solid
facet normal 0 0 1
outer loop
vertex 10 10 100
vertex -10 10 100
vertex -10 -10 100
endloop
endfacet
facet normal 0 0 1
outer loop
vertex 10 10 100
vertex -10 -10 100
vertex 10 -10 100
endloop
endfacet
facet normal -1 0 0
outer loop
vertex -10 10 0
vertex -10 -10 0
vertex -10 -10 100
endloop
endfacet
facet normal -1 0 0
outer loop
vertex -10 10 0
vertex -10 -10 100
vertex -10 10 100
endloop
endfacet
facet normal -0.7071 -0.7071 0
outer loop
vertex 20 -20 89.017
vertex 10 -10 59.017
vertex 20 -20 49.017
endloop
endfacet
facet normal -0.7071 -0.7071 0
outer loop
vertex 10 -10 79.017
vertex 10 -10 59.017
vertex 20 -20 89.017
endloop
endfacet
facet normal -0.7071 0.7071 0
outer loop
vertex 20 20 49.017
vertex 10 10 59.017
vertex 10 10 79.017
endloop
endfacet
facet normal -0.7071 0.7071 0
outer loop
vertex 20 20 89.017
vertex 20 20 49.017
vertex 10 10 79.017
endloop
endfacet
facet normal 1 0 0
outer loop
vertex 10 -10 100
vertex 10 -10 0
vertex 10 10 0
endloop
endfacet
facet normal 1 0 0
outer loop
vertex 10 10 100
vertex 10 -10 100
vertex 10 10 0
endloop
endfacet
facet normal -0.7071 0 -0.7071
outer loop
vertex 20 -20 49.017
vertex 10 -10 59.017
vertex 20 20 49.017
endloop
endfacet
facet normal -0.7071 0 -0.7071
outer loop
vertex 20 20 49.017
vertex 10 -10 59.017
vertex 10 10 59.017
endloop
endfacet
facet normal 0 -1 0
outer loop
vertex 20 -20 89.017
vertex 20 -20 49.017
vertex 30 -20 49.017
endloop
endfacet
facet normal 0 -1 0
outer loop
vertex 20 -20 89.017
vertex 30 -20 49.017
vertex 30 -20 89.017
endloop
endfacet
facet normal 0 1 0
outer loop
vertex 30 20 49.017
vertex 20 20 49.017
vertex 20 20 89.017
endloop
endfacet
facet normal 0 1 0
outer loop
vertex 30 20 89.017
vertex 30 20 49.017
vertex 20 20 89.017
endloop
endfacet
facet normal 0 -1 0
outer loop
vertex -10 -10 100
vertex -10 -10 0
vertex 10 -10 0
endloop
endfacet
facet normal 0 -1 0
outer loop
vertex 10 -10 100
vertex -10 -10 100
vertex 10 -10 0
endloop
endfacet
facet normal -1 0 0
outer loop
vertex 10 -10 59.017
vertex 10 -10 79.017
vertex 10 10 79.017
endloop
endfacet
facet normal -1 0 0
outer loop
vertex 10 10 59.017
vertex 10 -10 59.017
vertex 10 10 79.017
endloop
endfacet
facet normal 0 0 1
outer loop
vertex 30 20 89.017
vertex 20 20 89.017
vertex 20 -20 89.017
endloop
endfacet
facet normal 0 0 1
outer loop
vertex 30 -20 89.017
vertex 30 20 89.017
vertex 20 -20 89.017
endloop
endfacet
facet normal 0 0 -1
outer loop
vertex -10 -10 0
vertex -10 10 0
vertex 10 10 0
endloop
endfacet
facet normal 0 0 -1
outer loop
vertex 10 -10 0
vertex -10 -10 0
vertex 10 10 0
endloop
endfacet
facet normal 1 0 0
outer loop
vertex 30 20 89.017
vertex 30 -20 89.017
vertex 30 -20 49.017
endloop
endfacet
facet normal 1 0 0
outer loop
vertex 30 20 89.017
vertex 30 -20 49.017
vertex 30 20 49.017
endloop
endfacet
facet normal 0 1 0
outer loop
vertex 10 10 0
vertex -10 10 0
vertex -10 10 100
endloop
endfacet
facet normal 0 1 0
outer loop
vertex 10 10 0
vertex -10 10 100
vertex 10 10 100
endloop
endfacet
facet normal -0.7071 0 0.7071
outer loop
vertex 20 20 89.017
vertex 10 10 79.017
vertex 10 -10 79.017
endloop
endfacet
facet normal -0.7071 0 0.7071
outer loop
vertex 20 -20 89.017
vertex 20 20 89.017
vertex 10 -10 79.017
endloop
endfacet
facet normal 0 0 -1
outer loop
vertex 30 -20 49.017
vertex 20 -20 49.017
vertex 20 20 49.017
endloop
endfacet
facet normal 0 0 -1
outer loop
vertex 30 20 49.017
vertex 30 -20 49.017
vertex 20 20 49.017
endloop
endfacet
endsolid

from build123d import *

# Parameters (mm, degrees)
F0_W     = 20
F0_H     = 20
F1_DEPTH = 100
F2_W     = 10
F2_H     = 40
F2_W_2   = 20
F3_DEPTH = 20
F4_SIZE  = 10


with BuildPart() as f1:
    # F0 (on Top) → F1 (new body)
    with BuildSketch(Plane.XY):
        Rectangle(F0_W, F0_H)
    extrude(amount=F1_DEPTH)


with BuildPart() as f3:
    # F2 (on face) → F3 (new body)
    with BuildSketch(Plane.YZ.offset(10)):
        with Locations((-15, 69.0170936286)):
            Rectangle(F2_W, F2_H)
        with Locations((0, 69.0170936286)):
            Rectangle(F2_W_2, F2_H)
        with Locations((15, 69.0170936286)):
            Rectangle(F2_W, F2_H)
    extrude(amount=F3_DEPTH)

    # F4
    f4_edges = [f3.edges().sort_by_distance(p)[0] for p in [
        (10, 0, 89.017094),
        (10, -20, 69.017094),
        (10, 0, 49.017094),
        (10, 20, 69.017094),
    ]]
    chamfer(f4_edges, length=F4_SIZE)


solid = Compound([f1.part, f3.part])
